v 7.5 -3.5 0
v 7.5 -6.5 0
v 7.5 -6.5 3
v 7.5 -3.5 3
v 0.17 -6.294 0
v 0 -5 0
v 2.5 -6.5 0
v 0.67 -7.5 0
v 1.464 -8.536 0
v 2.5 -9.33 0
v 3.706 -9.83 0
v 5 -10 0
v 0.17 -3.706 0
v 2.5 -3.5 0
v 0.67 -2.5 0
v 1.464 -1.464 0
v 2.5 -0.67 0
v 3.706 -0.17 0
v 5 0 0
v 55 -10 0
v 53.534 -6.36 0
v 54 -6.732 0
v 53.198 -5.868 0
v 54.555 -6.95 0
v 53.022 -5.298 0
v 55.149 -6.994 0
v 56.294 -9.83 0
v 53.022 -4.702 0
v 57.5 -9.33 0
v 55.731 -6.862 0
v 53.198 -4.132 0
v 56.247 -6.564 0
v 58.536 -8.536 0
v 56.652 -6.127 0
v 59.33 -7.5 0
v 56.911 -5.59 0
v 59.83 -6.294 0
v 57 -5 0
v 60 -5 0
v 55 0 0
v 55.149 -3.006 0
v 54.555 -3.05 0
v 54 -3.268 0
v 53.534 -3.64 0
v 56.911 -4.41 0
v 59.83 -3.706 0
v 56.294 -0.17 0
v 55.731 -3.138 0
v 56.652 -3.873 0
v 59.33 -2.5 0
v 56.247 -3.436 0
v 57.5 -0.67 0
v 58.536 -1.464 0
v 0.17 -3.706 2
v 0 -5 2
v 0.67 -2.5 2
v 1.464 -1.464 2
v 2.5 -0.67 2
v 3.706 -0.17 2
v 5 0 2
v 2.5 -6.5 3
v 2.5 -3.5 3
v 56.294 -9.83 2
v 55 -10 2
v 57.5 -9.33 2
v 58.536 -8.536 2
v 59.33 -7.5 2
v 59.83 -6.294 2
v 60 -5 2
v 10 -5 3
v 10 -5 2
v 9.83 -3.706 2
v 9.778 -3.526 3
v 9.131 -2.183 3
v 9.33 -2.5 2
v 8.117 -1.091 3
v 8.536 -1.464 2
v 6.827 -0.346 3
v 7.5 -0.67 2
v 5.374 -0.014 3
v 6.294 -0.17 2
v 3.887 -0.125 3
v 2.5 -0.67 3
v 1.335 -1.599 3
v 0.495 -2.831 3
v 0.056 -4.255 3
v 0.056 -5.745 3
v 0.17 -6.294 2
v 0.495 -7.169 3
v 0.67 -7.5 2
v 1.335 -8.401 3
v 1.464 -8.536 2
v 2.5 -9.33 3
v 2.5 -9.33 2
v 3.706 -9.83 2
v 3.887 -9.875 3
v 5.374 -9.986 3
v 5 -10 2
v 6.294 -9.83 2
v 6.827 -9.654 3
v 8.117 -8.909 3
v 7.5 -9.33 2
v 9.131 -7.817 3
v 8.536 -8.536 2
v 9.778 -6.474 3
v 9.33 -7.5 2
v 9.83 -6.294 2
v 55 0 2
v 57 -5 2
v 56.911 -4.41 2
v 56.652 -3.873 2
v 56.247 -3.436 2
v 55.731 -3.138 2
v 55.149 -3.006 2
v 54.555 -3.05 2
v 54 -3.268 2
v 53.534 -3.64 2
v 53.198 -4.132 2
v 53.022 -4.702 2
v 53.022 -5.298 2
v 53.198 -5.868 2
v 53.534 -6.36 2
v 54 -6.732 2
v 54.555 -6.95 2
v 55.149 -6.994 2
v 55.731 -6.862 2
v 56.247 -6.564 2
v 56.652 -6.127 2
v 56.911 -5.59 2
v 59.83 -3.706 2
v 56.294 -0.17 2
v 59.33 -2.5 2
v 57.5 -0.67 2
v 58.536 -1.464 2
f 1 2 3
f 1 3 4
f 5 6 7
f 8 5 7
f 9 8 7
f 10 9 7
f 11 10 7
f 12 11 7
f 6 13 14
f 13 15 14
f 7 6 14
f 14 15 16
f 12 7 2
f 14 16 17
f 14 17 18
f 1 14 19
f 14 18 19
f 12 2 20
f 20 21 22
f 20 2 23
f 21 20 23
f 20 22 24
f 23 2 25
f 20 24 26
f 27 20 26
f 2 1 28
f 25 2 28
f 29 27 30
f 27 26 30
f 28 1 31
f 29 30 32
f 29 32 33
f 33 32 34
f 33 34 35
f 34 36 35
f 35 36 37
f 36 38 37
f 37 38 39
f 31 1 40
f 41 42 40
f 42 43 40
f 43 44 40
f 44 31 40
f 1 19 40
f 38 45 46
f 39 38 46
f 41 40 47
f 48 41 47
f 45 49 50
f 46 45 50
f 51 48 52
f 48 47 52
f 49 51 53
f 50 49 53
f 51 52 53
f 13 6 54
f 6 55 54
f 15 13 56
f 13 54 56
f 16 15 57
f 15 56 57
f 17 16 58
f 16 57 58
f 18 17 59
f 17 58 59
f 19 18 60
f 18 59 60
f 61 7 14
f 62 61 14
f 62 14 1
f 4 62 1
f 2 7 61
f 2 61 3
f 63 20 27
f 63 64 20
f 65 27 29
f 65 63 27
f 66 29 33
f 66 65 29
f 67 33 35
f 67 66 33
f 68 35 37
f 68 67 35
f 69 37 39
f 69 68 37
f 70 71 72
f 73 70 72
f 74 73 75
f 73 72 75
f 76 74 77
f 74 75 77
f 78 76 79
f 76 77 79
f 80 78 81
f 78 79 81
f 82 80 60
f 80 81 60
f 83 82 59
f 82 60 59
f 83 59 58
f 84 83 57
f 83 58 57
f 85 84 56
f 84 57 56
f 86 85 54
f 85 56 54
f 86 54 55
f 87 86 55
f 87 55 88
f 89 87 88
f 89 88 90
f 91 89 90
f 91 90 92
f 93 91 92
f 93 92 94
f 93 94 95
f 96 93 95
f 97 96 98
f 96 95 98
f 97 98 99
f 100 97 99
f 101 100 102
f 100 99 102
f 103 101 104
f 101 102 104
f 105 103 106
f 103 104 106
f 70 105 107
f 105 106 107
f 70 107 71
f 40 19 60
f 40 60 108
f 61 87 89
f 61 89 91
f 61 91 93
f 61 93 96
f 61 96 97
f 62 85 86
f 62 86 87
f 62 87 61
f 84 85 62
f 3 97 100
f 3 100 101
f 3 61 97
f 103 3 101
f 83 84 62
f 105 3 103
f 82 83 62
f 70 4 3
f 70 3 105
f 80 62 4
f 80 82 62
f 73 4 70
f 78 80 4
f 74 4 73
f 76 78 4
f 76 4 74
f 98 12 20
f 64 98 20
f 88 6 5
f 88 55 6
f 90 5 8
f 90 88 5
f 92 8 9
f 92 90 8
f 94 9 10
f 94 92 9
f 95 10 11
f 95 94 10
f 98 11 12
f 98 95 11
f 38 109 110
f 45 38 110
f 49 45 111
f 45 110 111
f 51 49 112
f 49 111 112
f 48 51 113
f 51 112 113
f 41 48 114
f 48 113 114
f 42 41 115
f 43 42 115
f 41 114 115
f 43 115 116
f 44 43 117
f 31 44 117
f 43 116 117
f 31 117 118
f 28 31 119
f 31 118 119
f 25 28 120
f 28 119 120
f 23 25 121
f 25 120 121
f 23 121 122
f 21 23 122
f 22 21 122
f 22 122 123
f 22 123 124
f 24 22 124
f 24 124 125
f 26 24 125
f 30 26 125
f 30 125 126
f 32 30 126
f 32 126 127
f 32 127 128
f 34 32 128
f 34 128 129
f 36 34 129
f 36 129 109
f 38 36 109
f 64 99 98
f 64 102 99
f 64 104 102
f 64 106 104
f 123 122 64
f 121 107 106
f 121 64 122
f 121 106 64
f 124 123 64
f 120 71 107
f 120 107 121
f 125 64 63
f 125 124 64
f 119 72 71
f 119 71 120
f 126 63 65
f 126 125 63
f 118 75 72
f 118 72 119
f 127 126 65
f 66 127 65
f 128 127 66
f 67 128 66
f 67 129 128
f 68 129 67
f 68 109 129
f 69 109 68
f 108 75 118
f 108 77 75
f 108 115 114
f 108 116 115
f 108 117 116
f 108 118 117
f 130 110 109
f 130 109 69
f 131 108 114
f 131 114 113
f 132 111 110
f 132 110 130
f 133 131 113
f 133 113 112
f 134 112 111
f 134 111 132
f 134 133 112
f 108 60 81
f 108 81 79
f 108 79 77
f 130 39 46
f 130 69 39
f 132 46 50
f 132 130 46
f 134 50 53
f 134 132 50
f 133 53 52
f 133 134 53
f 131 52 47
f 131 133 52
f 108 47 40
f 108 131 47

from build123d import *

# Parameters (mm, degrees)
F0_W          = 60
F0_H          = 10
F1_DEPTH      = 2
F2_R          = 4.99999
F3_R          = 5
F4_DEPTH      = 1
F5_W          = 5
F5_H          = 3
F6_DEPTH      = 1.001
F6_DEPTH_BACK = 2.001
F7_R          = 2
F8_DEPTH      = 2.001


# Not quite as in the source:
# - a fillet or chamfer is up to 0.001 mm smaller than in the source, because OpenCascade refuses the exact size


with BuildPart() as f1:
    # F0 (on Top) → F1 (new body)
    with BuildSketch(Plane.XY):
        with Locations((30, -5)):
            Rectangle(F0_W, F0_H)
    extrude(amount=F1_DEPTH)

    # F2 (radius 5 in the source; OpenCascade refuses exactly that, so slightly less here)
    f2_edges = [f1.edges().sort_by_distance(p)[0] for p in [
        (0, -10, 1),
        (0, 0, 1),
        (60, -10, 1),
        (60, 0, 1),
    ]]
    fillet(f2_edges, radius=F2_R)

    # F3 (on face) → F4 (join)
    with BuildSketch(Plane.XY.offset(2)):
        with Locations((5, -5)):
            Circle(F3_R)
    extrude(amount=F4_DEPTH)

    # F5 (on face) → F6 (cut, two sides)
    with BuildSketch(Plane.XY.offset(2)) as f6_sk:
        with Locations((5, -5)):
            Rectangle(F5_W, F5_H)
    extrude(amount=F6_DEPTH, mode=Mode.SUBTRACT)
    extrude(f6_sk.sketch, amount=-F6_DEPTH_BACK, mode=Mode.SUBTRACT)

    # F7 (on face) → F8 (cut, through all)
    with BuildSketch(Plane.XY.offset(2)):
        with Locations((55, -5)):
            Circle(F7_R)
    extrude(amount=-F8_DEPTH, mode=Mode.SUBTRACT)


solid = f1.part
